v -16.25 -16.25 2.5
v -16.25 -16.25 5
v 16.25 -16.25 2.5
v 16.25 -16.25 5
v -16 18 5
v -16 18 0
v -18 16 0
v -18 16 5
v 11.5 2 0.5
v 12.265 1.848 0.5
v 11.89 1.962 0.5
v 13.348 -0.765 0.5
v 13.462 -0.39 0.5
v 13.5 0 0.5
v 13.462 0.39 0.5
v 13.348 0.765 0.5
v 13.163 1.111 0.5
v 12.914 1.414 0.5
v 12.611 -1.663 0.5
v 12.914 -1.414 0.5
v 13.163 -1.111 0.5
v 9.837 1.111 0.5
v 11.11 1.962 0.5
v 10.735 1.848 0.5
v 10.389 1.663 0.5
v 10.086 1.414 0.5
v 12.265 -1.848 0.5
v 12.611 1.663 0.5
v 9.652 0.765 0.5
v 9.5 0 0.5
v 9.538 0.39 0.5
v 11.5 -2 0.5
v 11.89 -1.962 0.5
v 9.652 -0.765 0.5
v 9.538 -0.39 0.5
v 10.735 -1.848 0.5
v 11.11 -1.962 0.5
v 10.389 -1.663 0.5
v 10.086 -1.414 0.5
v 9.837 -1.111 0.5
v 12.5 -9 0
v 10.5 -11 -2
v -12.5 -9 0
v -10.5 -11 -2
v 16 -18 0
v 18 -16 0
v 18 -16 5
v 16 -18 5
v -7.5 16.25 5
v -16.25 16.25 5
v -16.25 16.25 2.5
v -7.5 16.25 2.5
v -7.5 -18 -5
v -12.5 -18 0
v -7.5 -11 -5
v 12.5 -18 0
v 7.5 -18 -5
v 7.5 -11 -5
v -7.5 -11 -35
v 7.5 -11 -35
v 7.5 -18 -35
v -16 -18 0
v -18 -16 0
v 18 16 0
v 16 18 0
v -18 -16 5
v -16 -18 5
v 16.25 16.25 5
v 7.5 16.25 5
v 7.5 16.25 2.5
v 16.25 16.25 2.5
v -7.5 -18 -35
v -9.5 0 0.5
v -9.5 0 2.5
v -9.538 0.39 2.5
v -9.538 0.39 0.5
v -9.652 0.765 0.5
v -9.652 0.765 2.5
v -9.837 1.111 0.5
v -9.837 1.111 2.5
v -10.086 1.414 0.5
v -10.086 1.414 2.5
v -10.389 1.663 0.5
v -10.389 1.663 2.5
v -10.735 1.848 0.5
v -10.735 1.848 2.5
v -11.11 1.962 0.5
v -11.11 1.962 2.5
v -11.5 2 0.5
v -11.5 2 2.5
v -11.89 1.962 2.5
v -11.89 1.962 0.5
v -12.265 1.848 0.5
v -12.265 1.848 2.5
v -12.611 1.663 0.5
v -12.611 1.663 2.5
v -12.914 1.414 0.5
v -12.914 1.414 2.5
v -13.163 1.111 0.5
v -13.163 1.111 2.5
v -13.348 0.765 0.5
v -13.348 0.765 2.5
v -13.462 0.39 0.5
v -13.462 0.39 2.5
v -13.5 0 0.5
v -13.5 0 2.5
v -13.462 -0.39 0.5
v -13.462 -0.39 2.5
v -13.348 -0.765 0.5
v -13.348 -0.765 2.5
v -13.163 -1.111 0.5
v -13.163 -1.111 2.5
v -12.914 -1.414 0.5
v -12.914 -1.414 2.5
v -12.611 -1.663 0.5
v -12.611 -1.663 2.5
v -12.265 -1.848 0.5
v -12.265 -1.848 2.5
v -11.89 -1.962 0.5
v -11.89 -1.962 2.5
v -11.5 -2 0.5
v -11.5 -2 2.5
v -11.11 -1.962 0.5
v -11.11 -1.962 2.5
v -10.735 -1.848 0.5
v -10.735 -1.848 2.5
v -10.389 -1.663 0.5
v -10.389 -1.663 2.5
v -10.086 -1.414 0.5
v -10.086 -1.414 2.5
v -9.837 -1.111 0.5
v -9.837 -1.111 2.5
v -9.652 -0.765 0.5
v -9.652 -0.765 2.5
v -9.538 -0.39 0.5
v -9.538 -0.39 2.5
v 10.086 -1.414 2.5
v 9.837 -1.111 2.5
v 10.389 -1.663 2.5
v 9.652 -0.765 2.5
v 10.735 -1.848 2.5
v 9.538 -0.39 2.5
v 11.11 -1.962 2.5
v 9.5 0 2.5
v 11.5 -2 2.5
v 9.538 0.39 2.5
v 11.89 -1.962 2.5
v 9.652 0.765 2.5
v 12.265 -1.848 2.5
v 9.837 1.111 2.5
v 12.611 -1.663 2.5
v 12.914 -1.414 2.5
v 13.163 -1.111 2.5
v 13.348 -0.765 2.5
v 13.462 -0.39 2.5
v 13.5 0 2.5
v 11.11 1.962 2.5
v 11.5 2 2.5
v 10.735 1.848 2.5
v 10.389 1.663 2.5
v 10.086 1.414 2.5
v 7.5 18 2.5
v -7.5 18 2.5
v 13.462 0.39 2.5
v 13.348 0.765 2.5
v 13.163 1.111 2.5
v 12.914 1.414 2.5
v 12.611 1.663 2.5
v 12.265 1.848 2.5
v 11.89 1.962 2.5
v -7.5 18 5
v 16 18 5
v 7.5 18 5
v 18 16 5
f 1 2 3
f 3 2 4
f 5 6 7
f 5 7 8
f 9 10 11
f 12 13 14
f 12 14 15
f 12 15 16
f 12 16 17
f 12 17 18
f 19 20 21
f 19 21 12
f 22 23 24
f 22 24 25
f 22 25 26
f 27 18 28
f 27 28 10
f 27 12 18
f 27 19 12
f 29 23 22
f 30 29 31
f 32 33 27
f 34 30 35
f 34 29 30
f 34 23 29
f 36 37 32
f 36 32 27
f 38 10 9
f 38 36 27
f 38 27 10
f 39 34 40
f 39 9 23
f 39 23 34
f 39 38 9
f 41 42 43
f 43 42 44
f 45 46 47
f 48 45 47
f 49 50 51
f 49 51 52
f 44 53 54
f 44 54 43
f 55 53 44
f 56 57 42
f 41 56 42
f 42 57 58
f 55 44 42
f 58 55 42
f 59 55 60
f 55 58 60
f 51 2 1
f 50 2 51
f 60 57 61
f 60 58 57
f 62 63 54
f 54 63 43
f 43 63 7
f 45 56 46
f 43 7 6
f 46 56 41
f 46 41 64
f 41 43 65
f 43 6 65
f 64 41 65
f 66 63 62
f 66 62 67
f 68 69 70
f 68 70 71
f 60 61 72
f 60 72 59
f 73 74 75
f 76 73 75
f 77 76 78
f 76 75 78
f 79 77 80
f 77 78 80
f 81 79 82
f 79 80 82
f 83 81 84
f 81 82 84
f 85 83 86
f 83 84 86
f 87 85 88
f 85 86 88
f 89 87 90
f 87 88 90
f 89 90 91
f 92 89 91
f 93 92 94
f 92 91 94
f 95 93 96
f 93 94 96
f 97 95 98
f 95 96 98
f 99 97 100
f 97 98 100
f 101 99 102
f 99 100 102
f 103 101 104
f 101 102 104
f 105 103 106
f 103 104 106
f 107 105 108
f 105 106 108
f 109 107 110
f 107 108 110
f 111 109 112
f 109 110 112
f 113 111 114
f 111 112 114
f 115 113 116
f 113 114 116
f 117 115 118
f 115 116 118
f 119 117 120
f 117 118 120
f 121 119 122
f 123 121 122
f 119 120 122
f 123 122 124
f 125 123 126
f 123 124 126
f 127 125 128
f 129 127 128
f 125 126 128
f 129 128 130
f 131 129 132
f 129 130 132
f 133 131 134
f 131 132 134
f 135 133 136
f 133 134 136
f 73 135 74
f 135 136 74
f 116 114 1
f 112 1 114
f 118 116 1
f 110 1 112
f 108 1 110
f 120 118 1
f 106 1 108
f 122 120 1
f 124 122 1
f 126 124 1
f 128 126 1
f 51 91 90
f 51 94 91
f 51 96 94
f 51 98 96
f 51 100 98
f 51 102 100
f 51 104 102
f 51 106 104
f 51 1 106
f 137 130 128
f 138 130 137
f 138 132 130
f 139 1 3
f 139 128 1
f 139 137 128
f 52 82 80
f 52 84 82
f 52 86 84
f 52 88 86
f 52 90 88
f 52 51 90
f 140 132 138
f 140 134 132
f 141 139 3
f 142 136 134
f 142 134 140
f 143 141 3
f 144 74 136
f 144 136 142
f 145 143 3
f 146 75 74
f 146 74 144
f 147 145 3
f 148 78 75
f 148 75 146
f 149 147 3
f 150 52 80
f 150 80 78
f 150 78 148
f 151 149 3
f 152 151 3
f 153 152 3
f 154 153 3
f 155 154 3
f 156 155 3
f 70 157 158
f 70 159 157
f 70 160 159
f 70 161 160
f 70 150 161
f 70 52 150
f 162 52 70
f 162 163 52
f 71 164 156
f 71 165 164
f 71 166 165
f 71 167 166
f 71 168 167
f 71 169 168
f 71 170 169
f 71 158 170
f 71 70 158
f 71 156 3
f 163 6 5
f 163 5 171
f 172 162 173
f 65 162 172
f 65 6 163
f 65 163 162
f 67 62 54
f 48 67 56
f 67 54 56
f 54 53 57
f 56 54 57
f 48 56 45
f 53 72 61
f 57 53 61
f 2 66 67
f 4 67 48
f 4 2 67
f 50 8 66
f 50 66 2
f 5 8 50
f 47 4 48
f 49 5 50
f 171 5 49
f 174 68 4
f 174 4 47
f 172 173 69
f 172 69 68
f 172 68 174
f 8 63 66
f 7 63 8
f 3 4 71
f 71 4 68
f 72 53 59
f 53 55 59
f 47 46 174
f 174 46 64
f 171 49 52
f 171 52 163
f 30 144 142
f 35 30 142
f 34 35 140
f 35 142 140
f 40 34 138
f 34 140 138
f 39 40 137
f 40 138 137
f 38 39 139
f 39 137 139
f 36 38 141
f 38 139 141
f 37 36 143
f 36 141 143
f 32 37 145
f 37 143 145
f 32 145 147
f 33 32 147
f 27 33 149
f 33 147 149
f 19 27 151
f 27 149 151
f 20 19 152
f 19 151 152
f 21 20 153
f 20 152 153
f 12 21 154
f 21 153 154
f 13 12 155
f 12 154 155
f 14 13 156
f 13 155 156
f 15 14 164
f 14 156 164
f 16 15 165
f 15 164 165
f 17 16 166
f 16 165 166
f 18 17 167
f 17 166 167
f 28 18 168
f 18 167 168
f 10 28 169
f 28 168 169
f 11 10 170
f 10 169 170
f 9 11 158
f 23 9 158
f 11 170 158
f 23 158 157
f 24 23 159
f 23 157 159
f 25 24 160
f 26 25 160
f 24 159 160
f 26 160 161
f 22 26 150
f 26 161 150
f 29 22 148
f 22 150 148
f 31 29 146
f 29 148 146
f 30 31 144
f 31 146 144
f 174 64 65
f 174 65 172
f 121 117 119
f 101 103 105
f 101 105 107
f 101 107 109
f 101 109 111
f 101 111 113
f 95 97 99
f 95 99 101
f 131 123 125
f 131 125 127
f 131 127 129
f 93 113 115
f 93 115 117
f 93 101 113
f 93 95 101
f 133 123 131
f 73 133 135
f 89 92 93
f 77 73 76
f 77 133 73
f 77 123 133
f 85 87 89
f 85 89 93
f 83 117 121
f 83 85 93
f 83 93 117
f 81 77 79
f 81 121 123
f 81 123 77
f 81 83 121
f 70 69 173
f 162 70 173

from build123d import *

# Parameters (mm, degrees)
SKETCH3_W           = 36
SKETCH3_H           = 36
BOSS_EXTRUDE2_DEPTH = 5
SKETCH4_W           = 32.5
SKETCH4_H           = 32.5
SKETCH4_W_2         = 15
SKETCH4_H_2         = 1.75
CUT_EXTRUDE1_DEPTH  = 2.5
SKETCH6_W           = 35
SKETCH6_H           = 7
BOSS_EXTRUDE3_DEPTH = 7.5
CHAMFER1_SIZE       = 5
CHAMFER2_SIZE       = 2
SKETCH7_R           = 2
CUT_EXTRUDE2_DEPTH  = 2
CHAMFER3_SIZE       = 2


with BuildPart() as part:
    # Sketch3 → Boss-Extrude2 (new body)
    with BuildSketch(Plane.XY):
        Rectangle(SKETCH3_W, SKETCH3_H)
    extrude(amount=BOSS_EXTRUDE2_DEPTH)

    # Sketch4 → Cut-Extrude1 (cut)
    with BuildSketch(Plane.XY.offset(5)):
        Rectangle(SKETCH4_W, SKETCH4_H)
        with Locations((0, 17.125)):
            Rectangle(SKETCH4_W_2, SKETCH4_H_2)
    extrude(amount=-CUT_EXTRUDE1_DEPTH, mode=Mode.SUBTRACT)

    # Sketch6 → Boss-Extrude3 (add, symmetric)
    with BuildSketch(Plane(origin=(0, 0, 0), x_dir=(0, 0, -1), z_dir=(1, 0, 0))):
        with Locations((17.5, -14.5)):
            Rectangle(SKETCH6_W, SKETCH6_H)
    extrude(amount=BOSS_EXTRUDE3_DEPTH, both=True)

    # Chamfer1
    chamfer1_edges = [part.edges().sort_by_distance(p)[0] for p in [
        (-7.5, -14.5, 0),
        (7.5, -14.5, 0),
    ]]
    chamfer(chamfer1_edges, length=CHAMFER1_SIZE)

    # Chamfer2
    chamfer2_edges = [part.edges().sort_by_distance(p)[0] for p in [
        (18, -18, 2.5),
        (-18, -18, 2.5),
        (-18, 18, 2.5),
        (18, 18, 2.5),
    ]]
    chamfer(chamfer2_edges, length=CHAMFER2_SIZE)

    # Sketch7 → Cut-Extrude2 (cut)
    with BuildSketch(Plane.XY.offset(2.5)):
        with Locations((-11.5, 0)):
            Circle(SKETCH7_R)
        with Locations(Location((11.5, 0, 0), (0, 0, 180))):
            Circle(SKETCH7_R)
    extrude(amount=-CUT_EXTRUDE2_DEPTH, mode=Mode.SUBTRACT)

    # Chamfer3
    chamfer3_edges = [part.edges().sort_by_distance(p)[0] for p in [
        (0, -11, 0),
    ]]
    chamfer(chamfer3_edges, length=CHAMFER3_SIZE)


solid = part.part
